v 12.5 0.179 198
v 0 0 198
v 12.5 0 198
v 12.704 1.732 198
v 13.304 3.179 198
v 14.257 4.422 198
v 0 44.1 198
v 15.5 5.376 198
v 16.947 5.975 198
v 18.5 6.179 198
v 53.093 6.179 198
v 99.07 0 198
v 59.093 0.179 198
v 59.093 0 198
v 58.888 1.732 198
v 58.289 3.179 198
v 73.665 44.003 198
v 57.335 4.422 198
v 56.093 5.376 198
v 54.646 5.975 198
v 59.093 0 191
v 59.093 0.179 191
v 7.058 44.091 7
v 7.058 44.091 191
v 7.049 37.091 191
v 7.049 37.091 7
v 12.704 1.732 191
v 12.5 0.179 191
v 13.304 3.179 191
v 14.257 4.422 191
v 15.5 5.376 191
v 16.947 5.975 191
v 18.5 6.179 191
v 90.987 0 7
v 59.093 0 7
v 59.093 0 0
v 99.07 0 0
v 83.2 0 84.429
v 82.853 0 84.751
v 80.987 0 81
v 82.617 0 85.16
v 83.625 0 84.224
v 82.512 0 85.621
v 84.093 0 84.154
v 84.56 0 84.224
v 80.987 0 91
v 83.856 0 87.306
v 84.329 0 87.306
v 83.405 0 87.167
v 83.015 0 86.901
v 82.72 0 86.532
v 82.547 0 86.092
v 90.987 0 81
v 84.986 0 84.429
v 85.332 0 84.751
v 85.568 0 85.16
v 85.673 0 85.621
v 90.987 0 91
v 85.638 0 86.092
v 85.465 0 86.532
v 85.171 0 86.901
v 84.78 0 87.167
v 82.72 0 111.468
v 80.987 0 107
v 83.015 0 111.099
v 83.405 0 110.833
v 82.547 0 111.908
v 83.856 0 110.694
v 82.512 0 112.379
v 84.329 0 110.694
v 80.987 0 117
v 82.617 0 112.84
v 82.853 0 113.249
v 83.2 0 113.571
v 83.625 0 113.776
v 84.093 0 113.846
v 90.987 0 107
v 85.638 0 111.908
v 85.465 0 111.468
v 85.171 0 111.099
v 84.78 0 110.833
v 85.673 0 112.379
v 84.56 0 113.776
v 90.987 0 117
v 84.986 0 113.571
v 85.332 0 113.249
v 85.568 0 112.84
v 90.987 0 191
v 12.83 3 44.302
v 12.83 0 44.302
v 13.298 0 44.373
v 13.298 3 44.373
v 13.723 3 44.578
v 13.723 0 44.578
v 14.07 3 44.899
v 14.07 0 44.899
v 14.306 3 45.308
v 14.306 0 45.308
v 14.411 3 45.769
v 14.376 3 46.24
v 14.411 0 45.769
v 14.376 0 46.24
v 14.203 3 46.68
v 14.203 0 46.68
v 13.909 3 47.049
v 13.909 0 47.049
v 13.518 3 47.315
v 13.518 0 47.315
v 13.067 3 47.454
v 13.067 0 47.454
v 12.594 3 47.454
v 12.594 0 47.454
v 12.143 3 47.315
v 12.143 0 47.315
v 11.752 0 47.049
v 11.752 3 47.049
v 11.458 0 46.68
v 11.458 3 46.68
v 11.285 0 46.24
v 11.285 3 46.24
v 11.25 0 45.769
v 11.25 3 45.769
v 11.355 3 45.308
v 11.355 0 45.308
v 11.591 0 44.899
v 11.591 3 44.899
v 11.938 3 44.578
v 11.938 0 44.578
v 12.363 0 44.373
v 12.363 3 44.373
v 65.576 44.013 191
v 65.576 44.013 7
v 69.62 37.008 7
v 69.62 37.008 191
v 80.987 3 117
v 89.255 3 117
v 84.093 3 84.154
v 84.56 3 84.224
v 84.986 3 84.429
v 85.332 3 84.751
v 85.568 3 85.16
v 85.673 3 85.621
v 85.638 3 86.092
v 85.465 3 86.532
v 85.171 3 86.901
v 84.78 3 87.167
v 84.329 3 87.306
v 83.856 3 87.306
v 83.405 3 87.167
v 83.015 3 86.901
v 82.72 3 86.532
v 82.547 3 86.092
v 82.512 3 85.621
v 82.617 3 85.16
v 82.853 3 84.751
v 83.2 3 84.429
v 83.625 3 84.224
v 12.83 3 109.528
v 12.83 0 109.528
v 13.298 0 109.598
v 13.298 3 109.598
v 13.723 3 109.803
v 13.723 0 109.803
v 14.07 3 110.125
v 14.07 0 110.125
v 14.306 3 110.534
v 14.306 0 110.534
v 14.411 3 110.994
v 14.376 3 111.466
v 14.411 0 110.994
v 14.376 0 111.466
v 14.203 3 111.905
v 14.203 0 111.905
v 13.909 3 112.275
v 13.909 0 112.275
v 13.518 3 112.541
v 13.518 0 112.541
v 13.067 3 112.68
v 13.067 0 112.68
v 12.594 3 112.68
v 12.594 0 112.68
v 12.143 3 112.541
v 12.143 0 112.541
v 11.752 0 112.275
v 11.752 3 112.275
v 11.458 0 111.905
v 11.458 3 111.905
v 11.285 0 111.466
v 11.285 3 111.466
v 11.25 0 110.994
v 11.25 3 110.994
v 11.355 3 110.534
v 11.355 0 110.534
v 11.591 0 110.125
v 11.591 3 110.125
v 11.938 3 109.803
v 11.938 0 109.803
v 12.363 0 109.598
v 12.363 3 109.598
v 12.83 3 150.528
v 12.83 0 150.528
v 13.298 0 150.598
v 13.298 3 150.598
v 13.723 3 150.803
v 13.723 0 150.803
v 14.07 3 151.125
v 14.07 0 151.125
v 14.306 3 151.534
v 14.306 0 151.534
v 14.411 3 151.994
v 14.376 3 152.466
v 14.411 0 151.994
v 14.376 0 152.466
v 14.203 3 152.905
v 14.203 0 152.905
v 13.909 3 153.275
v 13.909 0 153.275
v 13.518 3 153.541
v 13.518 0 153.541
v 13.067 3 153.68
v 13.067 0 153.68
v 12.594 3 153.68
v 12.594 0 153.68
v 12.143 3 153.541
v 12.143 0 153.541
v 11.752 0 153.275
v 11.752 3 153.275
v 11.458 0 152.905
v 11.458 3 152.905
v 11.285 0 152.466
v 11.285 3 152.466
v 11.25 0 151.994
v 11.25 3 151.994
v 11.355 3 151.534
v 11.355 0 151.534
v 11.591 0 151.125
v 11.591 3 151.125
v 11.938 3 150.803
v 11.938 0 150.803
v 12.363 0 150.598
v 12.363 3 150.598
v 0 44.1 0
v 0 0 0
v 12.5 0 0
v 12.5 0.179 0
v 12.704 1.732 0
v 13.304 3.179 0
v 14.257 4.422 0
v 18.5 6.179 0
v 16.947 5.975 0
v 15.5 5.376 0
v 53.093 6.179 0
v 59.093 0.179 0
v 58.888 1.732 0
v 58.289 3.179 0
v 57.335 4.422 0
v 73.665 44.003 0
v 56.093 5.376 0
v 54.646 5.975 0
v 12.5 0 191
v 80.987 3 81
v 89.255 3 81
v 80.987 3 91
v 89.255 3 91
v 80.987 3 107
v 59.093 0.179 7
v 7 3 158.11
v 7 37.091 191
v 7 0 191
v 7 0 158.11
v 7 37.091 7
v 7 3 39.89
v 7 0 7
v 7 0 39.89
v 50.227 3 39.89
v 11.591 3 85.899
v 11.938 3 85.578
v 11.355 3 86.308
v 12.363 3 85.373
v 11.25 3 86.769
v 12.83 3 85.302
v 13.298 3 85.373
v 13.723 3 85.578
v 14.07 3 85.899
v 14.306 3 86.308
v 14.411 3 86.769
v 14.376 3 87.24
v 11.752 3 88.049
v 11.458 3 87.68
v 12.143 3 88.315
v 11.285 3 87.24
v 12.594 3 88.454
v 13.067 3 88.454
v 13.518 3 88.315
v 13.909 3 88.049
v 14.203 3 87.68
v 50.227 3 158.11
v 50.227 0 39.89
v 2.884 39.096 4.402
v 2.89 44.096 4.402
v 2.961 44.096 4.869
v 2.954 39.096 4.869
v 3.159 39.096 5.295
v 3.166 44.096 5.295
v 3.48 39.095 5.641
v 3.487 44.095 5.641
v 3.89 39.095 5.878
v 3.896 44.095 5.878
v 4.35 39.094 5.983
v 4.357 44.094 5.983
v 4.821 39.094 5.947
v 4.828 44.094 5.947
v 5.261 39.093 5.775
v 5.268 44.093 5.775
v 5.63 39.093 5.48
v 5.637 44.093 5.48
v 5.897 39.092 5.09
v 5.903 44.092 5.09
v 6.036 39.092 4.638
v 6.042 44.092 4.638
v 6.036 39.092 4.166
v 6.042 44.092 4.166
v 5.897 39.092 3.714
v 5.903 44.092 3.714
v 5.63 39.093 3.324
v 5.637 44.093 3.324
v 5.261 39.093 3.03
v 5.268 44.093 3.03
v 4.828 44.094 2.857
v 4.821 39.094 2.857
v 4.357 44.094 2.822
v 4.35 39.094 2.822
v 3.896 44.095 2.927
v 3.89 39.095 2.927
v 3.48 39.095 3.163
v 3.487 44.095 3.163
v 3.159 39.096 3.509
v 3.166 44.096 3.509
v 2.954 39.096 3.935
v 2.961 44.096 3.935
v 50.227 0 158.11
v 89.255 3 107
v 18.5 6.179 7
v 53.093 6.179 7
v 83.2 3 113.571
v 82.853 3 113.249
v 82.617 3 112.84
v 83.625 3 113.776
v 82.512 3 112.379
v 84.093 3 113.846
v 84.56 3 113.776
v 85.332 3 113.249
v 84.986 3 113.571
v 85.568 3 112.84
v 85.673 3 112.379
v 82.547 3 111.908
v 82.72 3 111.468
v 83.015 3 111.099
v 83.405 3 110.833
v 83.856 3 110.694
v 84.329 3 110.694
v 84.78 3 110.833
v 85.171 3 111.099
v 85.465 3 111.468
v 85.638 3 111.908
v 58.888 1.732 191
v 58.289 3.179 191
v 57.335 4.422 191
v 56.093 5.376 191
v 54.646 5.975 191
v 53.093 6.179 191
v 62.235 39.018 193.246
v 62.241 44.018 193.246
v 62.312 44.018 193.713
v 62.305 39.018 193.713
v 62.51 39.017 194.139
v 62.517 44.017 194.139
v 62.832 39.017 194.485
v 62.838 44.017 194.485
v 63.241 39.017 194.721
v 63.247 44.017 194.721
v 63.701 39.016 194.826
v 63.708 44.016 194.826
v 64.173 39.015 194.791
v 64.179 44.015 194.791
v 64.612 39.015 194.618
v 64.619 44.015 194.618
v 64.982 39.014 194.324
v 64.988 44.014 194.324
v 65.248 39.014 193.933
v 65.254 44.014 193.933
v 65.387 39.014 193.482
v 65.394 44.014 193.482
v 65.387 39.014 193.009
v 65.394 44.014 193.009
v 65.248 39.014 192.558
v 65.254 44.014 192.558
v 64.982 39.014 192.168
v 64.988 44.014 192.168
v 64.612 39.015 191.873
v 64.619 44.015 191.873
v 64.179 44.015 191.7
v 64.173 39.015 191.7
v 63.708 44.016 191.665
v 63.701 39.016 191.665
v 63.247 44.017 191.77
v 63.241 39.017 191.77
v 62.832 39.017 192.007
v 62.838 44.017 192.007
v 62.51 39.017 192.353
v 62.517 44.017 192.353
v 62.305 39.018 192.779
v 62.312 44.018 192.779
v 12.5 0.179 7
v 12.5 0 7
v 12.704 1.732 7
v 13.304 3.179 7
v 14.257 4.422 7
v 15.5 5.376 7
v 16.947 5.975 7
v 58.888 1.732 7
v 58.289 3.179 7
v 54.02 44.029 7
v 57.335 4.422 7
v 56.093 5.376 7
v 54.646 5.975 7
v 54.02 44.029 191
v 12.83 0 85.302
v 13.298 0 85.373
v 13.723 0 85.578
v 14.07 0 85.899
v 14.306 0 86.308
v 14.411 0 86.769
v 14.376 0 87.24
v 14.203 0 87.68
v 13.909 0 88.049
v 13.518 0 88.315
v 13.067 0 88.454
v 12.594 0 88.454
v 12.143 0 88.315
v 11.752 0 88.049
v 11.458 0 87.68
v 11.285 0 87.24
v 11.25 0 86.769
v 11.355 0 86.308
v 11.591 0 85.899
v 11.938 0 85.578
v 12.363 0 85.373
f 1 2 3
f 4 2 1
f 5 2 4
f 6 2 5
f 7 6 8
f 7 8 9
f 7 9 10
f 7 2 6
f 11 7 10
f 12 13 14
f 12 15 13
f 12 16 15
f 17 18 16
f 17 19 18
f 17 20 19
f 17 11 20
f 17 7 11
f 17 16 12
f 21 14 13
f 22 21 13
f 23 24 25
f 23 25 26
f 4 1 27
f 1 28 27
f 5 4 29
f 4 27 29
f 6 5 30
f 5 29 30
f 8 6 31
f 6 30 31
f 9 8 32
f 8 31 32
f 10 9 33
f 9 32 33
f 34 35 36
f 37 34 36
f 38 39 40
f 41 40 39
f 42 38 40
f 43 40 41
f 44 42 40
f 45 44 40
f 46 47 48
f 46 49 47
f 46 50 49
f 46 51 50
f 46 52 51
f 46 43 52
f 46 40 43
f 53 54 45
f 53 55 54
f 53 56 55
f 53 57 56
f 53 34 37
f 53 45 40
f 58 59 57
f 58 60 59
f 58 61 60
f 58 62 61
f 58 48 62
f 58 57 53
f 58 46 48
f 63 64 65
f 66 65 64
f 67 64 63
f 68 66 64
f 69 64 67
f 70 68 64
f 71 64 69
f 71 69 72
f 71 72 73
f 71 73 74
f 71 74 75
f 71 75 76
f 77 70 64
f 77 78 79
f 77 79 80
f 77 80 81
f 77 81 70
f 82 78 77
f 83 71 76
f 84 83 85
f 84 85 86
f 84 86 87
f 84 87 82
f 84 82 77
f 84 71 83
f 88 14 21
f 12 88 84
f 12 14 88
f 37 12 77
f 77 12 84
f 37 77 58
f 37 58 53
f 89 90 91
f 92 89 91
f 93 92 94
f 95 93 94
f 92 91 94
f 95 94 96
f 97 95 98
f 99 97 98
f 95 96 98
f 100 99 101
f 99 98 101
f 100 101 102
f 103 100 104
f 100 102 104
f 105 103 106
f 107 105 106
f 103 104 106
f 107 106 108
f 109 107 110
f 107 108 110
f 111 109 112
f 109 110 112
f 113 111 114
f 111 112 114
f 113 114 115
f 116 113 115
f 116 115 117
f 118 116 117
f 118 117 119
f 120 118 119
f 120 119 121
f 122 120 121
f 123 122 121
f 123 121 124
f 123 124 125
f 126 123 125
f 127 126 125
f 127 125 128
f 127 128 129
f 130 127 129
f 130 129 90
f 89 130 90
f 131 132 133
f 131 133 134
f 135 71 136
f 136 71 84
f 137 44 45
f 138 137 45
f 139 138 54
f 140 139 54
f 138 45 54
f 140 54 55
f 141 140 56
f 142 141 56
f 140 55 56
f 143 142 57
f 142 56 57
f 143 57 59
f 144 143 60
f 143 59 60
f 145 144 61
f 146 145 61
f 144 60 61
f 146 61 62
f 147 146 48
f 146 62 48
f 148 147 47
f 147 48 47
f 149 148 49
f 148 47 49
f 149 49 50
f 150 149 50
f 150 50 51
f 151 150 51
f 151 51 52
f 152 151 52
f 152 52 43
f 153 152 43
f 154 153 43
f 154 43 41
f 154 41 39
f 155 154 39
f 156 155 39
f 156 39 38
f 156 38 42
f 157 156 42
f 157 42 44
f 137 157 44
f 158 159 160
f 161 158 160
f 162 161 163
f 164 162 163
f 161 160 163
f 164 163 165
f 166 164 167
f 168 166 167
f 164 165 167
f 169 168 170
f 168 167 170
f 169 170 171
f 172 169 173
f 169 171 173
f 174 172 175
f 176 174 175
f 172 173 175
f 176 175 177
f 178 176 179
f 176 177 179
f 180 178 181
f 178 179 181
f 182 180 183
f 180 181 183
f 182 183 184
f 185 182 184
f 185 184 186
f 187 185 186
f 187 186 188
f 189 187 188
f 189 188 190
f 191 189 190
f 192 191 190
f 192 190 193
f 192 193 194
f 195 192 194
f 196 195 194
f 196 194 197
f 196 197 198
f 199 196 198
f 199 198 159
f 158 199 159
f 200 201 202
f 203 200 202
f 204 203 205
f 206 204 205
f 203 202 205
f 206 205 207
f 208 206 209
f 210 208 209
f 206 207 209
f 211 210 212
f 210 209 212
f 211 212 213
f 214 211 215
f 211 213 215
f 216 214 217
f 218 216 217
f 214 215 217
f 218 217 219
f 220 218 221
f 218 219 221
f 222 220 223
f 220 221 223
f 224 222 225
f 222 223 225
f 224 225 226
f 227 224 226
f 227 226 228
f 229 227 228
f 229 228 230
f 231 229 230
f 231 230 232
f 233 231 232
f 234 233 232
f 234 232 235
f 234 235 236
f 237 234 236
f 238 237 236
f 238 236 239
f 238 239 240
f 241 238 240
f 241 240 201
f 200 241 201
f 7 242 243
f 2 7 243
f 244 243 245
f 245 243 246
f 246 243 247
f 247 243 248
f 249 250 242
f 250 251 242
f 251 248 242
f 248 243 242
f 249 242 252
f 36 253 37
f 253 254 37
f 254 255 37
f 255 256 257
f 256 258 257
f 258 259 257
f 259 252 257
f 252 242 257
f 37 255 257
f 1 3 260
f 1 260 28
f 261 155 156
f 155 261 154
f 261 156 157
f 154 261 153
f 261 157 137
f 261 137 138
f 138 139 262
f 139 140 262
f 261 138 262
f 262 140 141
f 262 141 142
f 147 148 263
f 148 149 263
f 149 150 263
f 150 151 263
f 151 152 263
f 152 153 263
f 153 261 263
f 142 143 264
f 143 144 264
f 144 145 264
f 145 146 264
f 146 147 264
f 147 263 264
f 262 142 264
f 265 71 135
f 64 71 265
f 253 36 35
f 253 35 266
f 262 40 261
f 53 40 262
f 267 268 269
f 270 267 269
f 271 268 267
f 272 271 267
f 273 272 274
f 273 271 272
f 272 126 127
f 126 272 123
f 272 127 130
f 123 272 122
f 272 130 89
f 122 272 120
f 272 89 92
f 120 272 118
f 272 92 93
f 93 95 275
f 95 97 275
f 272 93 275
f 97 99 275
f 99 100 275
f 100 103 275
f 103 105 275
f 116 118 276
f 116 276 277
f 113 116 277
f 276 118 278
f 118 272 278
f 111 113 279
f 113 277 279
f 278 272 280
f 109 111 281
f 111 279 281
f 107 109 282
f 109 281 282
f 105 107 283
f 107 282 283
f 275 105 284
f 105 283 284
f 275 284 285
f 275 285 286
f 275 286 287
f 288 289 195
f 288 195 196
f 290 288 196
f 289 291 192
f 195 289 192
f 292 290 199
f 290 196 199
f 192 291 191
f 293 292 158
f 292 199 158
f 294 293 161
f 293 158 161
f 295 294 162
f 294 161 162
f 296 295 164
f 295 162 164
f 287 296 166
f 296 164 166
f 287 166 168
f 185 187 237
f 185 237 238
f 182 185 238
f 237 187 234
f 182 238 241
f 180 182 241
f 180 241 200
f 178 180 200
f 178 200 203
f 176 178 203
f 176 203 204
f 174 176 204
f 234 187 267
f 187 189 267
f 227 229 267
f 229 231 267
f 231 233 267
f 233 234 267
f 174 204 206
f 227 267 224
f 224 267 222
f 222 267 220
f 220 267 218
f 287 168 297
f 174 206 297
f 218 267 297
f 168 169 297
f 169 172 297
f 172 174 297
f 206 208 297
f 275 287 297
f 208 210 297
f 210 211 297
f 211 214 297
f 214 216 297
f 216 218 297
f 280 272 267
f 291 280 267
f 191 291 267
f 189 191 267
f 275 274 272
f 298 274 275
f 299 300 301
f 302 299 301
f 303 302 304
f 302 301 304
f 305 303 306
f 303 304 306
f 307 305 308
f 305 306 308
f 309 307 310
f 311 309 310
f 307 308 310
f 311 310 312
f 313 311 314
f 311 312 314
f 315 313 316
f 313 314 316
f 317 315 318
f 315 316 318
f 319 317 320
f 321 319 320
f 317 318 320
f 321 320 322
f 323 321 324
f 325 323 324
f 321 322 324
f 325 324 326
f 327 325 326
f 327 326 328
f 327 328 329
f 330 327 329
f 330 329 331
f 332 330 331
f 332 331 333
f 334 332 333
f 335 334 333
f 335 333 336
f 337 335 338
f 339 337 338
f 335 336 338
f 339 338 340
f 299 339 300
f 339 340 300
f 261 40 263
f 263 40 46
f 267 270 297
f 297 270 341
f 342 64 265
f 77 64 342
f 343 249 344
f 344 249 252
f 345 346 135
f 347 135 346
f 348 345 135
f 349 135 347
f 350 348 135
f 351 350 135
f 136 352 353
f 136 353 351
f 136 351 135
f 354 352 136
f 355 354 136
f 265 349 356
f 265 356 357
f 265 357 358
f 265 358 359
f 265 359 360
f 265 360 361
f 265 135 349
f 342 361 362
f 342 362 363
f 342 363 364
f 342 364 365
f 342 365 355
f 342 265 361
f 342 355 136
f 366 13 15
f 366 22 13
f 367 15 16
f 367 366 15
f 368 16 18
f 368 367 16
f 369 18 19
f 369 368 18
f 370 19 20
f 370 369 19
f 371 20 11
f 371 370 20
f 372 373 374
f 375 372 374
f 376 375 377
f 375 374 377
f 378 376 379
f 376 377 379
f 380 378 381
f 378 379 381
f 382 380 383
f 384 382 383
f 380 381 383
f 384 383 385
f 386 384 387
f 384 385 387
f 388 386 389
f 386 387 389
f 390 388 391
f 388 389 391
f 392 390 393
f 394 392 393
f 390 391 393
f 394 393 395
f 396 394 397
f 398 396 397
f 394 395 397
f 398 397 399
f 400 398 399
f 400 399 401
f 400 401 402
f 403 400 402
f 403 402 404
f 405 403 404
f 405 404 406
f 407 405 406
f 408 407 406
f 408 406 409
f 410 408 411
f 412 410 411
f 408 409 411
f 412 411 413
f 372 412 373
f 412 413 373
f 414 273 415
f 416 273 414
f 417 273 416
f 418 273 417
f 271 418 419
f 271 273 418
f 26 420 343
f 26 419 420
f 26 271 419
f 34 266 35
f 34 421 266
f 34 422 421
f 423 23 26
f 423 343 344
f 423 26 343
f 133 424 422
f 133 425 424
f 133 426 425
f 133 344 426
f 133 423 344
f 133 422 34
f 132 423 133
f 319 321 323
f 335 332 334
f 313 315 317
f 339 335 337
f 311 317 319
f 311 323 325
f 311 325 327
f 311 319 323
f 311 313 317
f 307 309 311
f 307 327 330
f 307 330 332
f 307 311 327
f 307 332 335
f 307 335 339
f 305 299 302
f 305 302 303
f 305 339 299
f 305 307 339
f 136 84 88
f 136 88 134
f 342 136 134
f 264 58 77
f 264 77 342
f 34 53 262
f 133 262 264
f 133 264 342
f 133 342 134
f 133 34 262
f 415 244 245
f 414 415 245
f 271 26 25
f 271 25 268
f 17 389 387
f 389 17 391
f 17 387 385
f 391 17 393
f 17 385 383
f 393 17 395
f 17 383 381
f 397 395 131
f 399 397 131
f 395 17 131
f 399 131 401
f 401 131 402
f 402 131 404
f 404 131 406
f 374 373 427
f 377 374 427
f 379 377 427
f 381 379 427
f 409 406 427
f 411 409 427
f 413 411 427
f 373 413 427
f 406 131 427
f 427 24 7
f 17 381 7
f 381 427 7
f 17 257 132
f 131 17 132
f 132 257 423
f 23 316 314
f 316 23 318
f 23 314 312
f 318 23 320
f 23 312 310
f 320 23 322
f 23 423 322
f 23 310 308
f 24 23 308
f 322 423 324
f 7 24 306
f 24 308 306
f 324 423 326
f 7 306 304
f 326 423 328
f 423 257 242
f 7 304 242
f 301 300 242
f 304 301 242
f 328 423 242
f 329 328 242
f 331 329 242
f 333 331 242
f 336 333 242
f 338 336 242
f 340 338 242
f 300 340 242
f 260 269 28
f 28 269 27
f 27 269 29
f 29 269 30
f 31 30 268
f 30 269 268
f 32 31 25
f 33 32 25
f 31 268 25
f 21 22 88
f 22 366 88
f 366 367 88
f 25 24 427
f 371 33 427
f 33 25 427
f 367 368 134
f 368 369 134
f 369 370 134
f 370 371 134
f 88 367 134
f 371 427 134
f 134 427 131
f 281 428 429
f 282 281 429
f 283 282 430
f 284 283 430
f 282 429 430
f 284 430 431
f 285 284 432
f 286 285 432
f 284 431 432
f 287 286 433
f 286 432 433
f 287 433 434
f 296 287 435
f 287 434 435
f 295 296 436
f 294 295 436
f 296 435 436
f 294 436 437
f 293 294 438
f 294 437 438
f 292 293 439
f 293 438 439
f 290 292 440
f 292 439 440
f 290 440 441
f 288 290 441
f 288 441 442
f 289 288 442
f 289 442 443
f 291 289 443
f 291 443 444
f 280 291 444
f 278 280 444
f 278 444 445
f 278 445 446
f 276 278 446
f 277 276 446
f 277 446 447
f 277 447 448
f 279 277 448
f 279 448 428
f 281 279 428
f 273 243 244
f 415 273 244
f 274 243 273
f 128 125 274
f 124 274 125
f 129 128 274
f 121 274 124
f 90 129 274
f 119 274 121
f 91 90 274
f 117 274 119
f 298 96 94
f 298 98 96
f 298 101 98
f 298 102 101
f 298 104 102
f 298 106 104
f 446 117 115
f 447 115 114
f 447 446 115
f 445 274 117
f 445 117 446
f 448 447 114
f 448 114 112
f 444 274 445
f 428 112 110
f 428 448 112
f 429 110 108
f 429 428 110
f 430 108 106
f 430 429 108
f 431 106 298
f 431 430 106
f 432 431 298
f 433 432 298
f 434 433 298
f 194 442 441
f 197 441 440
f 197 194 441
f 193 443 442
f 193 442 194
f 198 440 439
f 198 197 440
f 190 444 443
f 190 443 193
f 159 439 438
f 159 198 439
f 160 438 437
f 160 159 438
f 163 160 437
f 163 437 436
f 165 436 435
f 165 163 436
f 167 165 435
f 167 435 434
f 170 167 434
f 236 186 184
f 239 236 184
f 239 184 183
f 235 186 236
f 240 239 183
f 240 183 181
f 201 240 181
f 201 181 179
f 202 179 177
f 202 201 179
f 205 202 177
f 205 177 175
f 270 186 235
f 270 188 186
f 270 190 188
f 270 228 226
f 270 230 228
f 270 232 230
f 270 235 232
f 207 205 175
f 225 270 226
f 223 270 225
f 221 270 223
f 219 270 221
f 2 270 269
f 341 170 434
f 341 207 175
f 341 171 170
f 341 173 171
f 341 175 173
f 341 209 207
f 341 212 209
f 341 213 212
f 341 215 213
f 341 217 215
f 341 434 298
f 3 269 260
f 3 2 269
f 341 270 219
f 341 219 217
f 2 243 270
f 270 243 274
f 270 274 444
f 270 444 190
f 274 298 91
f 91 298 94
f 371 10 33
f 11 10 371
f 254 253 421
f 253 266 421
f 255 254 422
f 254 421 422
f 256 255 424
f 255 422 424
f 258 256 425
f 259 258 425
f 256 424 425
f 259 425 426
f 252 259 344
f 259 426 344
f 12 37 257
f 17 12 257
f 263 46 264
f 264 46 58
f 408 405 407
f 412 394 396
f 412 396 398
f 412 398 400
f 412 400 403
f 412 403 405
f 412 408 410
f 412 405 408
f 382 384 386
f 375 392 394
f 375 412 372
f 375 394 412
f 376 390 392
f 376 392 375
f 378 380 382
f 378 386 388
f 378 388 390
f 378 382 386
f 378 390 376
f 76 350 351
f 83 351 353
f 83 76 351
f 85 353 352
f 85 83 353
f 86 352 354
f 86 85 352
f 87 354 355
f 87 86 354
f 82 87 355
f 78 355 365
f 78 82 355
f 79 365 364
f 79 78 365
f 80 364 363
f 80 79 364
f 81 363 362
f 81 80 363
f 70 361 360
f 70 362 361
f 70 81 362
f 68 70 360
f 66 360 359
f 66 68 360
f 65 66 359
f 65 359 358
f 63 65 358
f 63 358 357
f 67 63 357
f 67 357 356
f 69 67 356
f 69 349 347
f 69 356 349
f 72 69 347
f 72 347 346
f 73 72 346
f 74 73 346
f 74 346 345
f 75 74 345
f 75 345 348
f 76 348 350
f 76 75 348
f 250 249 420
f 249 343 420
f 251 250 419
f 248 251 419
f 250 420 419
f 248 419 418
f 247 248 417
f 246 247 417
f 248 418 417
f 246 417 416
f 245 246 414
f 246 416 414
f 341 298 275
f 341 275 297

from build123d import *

# Parameters (mm, degrees)
BOSS_EXTRUDE1_DEPTH = 198
SHELL1_T            = -7
SKETCH2_W           = 184
SKETCH2_H           = 91.833810452
CUT_EXTRUDE1_DEPTH  = 10
SKETCH3_W           = 51.015734787
SKETCH3_H           = 184
CUT_EXTRUDE3_DEPTH  = 10
SKETCH4_W           = 43.227096231
SKETCH4_H           = 118.22
SKETCH4_W_2         = 10
SKETCH4_H_2         = 10
BOSS_EXTRUDE2_DEPTH = 3
SKETCH6_R           = 1.585
CUT_EXTRUDE5_DEPTH  = 10
SKETCH10_R          = 1.585
CUT_EXTRUDE8_DEPTH  = 5
SKETCH9_W           = 46.592666587
SKETCH9_H           = 6.179476357
CUT_EXTRUDE7_DEPTH  = 10
FILLET1_R           = 6
FILLET2_R           = 6
SKETCH11_R          = 1.585
CUT_EXTRUDE9_DEPTH  = 5
SKETCH12_R          = 1.585
CUT_EXTRUDE10_DEPTH = 5


with BuildPart() as part:
    # Sketch1 → Boss-Extrude1 (new body)
    with BuildSketch(Plane.XY):
        Polygon((0, 0), (99.07, 0), (73.665, 44.002750766), (0, 44.1), align=None)
    extrude(amount=BOSS_EXTRUDE1_DEPTH)

    # Shell1
    shell1_openings = [part.faces().sort_by_distance(p)[0] for p in [
        (49.535, 0, 99),
    ]]
    offset(amount=SHELL1_T, openings=shell1_openings, kind=Kind.INTERSECTION)

    # Sketch2 → Cut-Extrude1 (cut)
    with BuildSketch(Plane(origin=(68.240322174, 39.398568376, 0), x_dir=(0, 0, 1), z_dir=(-0.866025403784436, -0.5000000000000048, 0))):
        with Locations((99, 0.42335711)):
            Rectangle(SKETCH2_W, SKETCH2_H)
    extrude(amount=CUT_EXTRUDE1_DEPTH, mode=Mode.SUBTRACT)

    # Sketch3 → Cut-Extrude3 (cut)
    with BuildSketch(Plane(origin=(0.058218743, 44.099923142, 0), x_dir=(0.9999991285962467, -0.001320154061894519, 0), z_dir=(0.001320154061894519, 0.9999991285962467, 0))):
        with Locations((32.507861294, -99)):
            Rectangle(SKETCH3_W, SKETCH3_H)
    extrude(amount=-CUT_EXTRUDE3_DEPTH, mode=Mode.SUBTRACT)

    # Sketch4 → Boss-Extrude2 (add)
    with BuildSketch(Plane.XZ):
        with Locations((28.613548116, 99)):
            Rectangle(SKETCH4_W, SKETCH4_H)
        with Locations((85.987096231, 86)):
            Rectangle(SKETCH4_W_2, SKETCH4_H_2)
    boss_extrude2 = extrude(amount=-BOSS_EXTRUDE2_DEPTH)

    # Sketch6 → Cut-Extrude5 (cut)
    with BuildSketch(Plane(origin=(0, 3, 0), x_dir=(1, 0, 0), z_dir=(0, 1, 0))):
        with Locations(Location((12.830469551, -45.887182752, 0), (0, 0, 270))):
            Circle(SKETCH6_R)
        with Locations(Location((12.830469551, -86.887182752, 0), (0, 0, 270))):
            Circle(SKETCH6_R)
        with Locations(Location((12.830469551, -111.112817248, 0), (0, 0, 270))):
            Circle(SKETCH6_R)
        with Locations(Location((12.830469551, -152.112817248, 0), (0, 0, 270))):
            Circle(SKETCH6_R)
    extrude(amount=-CUT_EXTRUDE5_DEPTH, mode=Mode.SUBTRACT)

    # Sketch10 → Cut-Extrude8 (cut)
    with BuildSketch(Plane.XZ):
        with Locations(Location((84.092666587, 85.739056505, 0), (0, 0, 270))):
            Circle(SKETCH10_R)
    cut_extrude8 = extrude(amount=-CUT_EXTRUDE8_DEPTH, mode=Mode.SUBTRACT)

    # Sketch9 → Cut-Extrude7 (cut)
    with BuildSketch(Plane.XY.offset(198)):
        with Locations((35.796333293, 3.089738179)):
            Rectangle(SKETCH9_W, SKETCH9_H)
    cut_extrude7 = extrude(amount=-CUT_EXTRUDE7_DEPTH, mode=Mode.SUBTRACT)

    # Mirror1: Cut-Extrude7 across plane
    add(cut_extrude7.mirror(Plane(origin=(0, 0, 99), x_dir=(1, 0, 0), z_dir=(0, 0, -1))), mode=Mode.SUBTRACT)

    # Fillet1
    fillet1_edges = [part.edges().sort_by_distance(p)[0] for p in [
        (12.5, 6.179476357, 3.5),
        (59.092666587, 6.179476357, 3.5),
    ]]
    fillet(fillet1_edges, radius=FILLET1_R)

    # Fillet2
    fillet2_edges = [part.edges().sort_by_distance(p)[0] for p in [
        (12.5, 6.179476357, 194.5),
        (59.092666587, 6.179476357, 194.5),
    ]]
    fillet(fillet2_edges, radius=FILLET2_R)

    # Mirror2: Boss-Extrude2, Cut-Extrude8 across plane
    add(boss_extrude2.mirror(Plane(origin=(0, 0, 99), x_dir=(1, 0, 0), z_dir=(0, 0, -1))))
    add(cut_extrude8.mirror(Plane(origin=(0, 0, 99), x_dir=(1, 0, 0), z_dir=(0, 0, -1))), mode=Mode.SUBTRACT)

    # Sketch11 → Cut-Extrude9 (cut)
    with BuildSketch(Plane.XZ):
        with Locations(Location((12.830469551, 152.112817248, 0), (0, 0, 270))):
            Circle(SKETCH11_R)
        with Locations(Location((12.830469551, 111.112817248, 0), (0, 0, 270))):
            Circle(SKETCH11_R)
        with Locations(Location((12.830469551, 86.887182752, 0), (0, 0, 270))):
            Circle(SKETCH11_R)
        with Locations(Location((12.830469551, 45.887182752, 0), (0, 0, 270))):
            Circle(SKETCH11_R)
    extrude(amount=-CUT_EXTRUDE9_DEPTH, mode=Mode.SUBTRACT)

    # Sketch12 → Cut-Extrude10 (cut)
    with BuildSketch(Plane(origin=(0.058218743, 44.099923142, 0), x_dir=(0.9999991285962467, -0.001320154061894519, 0), z_dir=(0.001320154061894519, 0.9999991285962467, 0))):
        with Locations(Location((63.768297777, -193.245706001, 0), (0, 0, 180))):
            Circle(SKETCH12_R)
        with Locations(Location((4.416986766, -4.402159503, 0), (0, 0, 180))):
            Circle(SKETCH12_R)
    extrude(amount=-CUT_EXTRUDE10_DEPTH, mode=Mode.SUBTRACT)


solid = part.part
